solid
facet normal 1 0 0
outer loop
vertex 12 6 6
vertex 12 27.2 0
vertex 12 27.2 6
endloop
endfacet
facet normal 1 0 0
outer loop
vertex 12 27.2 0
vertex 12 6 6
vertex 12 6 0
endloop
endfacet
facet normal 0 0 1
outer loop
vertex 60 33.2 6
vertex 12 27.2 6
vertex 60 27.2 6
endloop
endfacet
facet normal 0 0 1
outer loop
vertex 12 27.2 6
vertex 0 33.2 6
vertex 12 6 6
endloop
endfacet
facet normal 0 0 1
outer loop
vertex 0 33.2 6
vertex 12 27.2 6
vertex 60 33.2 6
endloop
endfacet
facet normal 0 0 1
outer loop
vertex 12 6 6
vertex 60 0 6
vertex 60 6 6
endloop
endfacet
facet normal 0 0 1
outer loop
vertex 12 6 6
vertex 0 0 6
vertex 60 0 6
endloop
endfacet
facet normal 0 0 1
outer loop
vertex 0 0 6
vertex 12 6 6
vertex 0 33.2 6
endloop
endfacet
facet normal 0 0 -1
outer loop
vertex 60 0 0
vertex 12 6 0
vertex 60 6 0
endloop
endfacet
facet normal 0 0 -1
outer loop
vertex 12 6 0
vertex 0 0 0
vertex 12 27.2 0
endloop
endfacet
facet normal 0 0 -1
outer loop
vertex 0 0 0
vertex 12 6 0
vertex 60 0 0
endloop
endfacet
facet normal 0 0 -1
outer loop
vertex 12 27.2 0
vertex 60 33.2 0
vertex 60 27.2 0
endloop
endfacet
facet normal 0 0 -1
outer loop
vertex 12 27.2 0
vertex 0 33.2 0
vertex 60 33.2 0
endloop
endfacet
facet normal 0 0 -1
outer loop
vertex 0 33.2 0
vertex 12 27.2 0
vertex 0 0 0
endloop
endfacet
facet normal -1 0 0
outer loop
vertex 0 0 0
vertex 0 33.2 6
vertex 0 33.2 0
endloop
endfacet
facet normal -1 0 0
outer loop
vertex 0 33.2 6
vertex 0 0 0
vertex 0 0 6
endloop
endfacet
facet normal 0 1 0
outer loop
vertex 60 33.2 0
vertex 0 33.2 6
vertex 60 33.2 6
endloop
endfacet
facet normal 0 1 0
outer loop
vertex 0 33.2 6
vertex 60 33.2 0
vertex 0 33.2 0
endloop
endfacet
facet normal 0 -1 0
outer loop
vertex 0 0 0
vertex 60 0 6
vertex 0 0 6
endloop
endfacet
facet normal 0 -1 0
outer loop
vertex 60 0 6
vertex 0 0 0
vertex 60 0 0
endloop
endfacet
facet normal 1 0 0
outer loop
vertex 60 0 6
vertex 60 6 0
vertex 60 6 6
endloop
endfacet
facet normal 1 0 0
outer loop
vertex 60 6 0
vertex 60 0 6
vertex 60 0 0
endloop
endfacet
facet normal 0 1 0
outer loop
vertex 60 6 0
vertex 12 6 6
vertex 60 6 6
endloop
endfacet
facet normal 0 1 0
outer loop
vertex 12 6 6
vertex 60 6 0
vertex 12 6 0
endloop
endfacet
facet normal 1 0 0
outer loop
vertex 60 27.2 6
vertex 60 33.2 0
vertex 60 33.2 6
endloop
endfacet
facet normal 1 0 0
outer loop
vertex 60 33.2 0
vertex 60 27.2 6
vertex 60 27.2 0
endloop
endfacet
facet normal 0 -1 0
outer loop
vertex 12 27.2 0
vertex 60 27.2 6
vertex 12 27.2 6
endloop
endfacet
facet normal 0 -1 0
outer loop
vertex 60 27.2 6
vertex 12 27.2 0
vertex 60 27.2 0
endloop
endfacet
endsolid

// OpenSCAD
// QualityRelay 5.0 rebuilt print kit
// Units: millimeters
// Export one part at a time by changing `part`.

part = "slot_good";

coupon_length = 60;
coupon_height = 6;
slot_base_length = 12;
slot_rail_width = 6;

module slot_coupon(inner_width) {
    outer_width = inner_width + 2 * slot_rail_width;
    union() {
        cube([slot_base_length, outer_width, coupon_height]);
        translate([slot_base_length, 0, 0])
            cube([coupon_length - slot_base_length, slot_rail_width, coupon_height]);
        translate([slot_base_length, slot_rail_width + inner_width, 0])
            cube([coupon_length - slot_base_length, slot_rail_width, coupon_height]);
    }
}

module tab_coupon(width) {
    cube([coupon_length, width, coupon_height]);
}

if (part == "slot_good") {
    slot_coupon(21.20);
} else if (part == "slot_nominal") {
    slot_coupon(21.00);
} else if (part == "slot_risk") {
    slot_coupon(20.70);
} else if (part == "tab_good") {
    tab_coupon(19.80);
} else if (part == "tab_nominal") {
    tab_coupon(20.00);
} else if (part == "tab_risk") {
    tab_coupon(20.30);
} else if (part == "repeatability_bar") {
    tab_coupon(20.00);
} else {
    assert(false, str("Unknown part: ", part));
}
